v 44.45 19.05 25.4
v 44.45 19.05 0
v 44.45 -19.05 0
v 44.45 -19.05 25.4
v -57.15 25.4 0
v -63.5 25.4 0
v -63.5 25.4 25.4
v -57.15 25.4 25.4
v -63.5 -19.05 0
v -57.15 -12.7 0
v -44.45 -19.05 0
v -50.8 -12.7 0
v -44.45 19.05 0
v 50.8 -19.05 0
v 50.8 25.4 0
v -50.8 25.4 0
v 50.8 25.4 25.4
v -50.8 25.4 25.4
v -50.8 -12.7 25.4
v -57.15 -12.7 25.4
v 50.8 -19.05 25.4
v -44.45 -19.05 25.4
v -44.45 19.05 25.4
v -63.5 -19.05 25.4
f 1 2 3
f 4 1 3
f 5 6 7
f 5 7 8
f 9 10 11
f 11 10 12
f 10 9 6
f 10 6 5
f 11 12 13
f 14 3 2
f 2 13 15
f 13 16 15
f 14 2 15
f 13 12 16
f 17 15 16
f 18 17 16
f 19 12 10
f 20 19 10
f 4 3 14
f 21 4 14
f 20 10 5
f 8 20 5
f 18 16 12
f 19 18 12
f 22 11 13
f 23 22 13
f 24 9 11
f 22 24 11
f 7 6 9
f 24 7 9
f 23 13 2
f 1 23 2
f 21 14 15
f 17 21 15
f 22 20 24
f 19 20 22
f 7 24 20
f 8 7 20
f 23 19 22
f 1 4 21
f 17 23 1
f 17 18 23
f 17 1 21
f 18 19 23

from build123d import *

# Parameters (mm, degrees)
F0_W     = 6.35
F0_H     = 38.1
F1_DEPTH = 25.4


with BuildPart() as f1:
    # F0 (on Top) → F1 (new body)
    with BuildSketch(Plane.XY):
        with Locations((-60.325, 6.35)):
            Rectangle(F0_W, F0_H)
        Polygon((-63.5, -19.05), (-50.8, -19.05), (-50.8, -12.7), (-57.15, -12.7), (-63.5, -12.7), align=None)
        Polygon((-50.8, -19.05), (-44.45, -19.05), (-44.45, 19.05), (-50.8, 19.05), (-50.8, -12.7), align=None)
        Polygon((-44.45, 19.05), (44.45, 19.05), (44.45, 25.4), (-50.8, 25.4), (-50.8, 19.05), align=None)
        Polygon((44.45, 19.05), (44.45, -19.05), (50.8, -19.05), (50.8, 25.4), (44.45, 25.4), align=None)
    extrude(amount=F1_DEPTH)


solid = f1.part
